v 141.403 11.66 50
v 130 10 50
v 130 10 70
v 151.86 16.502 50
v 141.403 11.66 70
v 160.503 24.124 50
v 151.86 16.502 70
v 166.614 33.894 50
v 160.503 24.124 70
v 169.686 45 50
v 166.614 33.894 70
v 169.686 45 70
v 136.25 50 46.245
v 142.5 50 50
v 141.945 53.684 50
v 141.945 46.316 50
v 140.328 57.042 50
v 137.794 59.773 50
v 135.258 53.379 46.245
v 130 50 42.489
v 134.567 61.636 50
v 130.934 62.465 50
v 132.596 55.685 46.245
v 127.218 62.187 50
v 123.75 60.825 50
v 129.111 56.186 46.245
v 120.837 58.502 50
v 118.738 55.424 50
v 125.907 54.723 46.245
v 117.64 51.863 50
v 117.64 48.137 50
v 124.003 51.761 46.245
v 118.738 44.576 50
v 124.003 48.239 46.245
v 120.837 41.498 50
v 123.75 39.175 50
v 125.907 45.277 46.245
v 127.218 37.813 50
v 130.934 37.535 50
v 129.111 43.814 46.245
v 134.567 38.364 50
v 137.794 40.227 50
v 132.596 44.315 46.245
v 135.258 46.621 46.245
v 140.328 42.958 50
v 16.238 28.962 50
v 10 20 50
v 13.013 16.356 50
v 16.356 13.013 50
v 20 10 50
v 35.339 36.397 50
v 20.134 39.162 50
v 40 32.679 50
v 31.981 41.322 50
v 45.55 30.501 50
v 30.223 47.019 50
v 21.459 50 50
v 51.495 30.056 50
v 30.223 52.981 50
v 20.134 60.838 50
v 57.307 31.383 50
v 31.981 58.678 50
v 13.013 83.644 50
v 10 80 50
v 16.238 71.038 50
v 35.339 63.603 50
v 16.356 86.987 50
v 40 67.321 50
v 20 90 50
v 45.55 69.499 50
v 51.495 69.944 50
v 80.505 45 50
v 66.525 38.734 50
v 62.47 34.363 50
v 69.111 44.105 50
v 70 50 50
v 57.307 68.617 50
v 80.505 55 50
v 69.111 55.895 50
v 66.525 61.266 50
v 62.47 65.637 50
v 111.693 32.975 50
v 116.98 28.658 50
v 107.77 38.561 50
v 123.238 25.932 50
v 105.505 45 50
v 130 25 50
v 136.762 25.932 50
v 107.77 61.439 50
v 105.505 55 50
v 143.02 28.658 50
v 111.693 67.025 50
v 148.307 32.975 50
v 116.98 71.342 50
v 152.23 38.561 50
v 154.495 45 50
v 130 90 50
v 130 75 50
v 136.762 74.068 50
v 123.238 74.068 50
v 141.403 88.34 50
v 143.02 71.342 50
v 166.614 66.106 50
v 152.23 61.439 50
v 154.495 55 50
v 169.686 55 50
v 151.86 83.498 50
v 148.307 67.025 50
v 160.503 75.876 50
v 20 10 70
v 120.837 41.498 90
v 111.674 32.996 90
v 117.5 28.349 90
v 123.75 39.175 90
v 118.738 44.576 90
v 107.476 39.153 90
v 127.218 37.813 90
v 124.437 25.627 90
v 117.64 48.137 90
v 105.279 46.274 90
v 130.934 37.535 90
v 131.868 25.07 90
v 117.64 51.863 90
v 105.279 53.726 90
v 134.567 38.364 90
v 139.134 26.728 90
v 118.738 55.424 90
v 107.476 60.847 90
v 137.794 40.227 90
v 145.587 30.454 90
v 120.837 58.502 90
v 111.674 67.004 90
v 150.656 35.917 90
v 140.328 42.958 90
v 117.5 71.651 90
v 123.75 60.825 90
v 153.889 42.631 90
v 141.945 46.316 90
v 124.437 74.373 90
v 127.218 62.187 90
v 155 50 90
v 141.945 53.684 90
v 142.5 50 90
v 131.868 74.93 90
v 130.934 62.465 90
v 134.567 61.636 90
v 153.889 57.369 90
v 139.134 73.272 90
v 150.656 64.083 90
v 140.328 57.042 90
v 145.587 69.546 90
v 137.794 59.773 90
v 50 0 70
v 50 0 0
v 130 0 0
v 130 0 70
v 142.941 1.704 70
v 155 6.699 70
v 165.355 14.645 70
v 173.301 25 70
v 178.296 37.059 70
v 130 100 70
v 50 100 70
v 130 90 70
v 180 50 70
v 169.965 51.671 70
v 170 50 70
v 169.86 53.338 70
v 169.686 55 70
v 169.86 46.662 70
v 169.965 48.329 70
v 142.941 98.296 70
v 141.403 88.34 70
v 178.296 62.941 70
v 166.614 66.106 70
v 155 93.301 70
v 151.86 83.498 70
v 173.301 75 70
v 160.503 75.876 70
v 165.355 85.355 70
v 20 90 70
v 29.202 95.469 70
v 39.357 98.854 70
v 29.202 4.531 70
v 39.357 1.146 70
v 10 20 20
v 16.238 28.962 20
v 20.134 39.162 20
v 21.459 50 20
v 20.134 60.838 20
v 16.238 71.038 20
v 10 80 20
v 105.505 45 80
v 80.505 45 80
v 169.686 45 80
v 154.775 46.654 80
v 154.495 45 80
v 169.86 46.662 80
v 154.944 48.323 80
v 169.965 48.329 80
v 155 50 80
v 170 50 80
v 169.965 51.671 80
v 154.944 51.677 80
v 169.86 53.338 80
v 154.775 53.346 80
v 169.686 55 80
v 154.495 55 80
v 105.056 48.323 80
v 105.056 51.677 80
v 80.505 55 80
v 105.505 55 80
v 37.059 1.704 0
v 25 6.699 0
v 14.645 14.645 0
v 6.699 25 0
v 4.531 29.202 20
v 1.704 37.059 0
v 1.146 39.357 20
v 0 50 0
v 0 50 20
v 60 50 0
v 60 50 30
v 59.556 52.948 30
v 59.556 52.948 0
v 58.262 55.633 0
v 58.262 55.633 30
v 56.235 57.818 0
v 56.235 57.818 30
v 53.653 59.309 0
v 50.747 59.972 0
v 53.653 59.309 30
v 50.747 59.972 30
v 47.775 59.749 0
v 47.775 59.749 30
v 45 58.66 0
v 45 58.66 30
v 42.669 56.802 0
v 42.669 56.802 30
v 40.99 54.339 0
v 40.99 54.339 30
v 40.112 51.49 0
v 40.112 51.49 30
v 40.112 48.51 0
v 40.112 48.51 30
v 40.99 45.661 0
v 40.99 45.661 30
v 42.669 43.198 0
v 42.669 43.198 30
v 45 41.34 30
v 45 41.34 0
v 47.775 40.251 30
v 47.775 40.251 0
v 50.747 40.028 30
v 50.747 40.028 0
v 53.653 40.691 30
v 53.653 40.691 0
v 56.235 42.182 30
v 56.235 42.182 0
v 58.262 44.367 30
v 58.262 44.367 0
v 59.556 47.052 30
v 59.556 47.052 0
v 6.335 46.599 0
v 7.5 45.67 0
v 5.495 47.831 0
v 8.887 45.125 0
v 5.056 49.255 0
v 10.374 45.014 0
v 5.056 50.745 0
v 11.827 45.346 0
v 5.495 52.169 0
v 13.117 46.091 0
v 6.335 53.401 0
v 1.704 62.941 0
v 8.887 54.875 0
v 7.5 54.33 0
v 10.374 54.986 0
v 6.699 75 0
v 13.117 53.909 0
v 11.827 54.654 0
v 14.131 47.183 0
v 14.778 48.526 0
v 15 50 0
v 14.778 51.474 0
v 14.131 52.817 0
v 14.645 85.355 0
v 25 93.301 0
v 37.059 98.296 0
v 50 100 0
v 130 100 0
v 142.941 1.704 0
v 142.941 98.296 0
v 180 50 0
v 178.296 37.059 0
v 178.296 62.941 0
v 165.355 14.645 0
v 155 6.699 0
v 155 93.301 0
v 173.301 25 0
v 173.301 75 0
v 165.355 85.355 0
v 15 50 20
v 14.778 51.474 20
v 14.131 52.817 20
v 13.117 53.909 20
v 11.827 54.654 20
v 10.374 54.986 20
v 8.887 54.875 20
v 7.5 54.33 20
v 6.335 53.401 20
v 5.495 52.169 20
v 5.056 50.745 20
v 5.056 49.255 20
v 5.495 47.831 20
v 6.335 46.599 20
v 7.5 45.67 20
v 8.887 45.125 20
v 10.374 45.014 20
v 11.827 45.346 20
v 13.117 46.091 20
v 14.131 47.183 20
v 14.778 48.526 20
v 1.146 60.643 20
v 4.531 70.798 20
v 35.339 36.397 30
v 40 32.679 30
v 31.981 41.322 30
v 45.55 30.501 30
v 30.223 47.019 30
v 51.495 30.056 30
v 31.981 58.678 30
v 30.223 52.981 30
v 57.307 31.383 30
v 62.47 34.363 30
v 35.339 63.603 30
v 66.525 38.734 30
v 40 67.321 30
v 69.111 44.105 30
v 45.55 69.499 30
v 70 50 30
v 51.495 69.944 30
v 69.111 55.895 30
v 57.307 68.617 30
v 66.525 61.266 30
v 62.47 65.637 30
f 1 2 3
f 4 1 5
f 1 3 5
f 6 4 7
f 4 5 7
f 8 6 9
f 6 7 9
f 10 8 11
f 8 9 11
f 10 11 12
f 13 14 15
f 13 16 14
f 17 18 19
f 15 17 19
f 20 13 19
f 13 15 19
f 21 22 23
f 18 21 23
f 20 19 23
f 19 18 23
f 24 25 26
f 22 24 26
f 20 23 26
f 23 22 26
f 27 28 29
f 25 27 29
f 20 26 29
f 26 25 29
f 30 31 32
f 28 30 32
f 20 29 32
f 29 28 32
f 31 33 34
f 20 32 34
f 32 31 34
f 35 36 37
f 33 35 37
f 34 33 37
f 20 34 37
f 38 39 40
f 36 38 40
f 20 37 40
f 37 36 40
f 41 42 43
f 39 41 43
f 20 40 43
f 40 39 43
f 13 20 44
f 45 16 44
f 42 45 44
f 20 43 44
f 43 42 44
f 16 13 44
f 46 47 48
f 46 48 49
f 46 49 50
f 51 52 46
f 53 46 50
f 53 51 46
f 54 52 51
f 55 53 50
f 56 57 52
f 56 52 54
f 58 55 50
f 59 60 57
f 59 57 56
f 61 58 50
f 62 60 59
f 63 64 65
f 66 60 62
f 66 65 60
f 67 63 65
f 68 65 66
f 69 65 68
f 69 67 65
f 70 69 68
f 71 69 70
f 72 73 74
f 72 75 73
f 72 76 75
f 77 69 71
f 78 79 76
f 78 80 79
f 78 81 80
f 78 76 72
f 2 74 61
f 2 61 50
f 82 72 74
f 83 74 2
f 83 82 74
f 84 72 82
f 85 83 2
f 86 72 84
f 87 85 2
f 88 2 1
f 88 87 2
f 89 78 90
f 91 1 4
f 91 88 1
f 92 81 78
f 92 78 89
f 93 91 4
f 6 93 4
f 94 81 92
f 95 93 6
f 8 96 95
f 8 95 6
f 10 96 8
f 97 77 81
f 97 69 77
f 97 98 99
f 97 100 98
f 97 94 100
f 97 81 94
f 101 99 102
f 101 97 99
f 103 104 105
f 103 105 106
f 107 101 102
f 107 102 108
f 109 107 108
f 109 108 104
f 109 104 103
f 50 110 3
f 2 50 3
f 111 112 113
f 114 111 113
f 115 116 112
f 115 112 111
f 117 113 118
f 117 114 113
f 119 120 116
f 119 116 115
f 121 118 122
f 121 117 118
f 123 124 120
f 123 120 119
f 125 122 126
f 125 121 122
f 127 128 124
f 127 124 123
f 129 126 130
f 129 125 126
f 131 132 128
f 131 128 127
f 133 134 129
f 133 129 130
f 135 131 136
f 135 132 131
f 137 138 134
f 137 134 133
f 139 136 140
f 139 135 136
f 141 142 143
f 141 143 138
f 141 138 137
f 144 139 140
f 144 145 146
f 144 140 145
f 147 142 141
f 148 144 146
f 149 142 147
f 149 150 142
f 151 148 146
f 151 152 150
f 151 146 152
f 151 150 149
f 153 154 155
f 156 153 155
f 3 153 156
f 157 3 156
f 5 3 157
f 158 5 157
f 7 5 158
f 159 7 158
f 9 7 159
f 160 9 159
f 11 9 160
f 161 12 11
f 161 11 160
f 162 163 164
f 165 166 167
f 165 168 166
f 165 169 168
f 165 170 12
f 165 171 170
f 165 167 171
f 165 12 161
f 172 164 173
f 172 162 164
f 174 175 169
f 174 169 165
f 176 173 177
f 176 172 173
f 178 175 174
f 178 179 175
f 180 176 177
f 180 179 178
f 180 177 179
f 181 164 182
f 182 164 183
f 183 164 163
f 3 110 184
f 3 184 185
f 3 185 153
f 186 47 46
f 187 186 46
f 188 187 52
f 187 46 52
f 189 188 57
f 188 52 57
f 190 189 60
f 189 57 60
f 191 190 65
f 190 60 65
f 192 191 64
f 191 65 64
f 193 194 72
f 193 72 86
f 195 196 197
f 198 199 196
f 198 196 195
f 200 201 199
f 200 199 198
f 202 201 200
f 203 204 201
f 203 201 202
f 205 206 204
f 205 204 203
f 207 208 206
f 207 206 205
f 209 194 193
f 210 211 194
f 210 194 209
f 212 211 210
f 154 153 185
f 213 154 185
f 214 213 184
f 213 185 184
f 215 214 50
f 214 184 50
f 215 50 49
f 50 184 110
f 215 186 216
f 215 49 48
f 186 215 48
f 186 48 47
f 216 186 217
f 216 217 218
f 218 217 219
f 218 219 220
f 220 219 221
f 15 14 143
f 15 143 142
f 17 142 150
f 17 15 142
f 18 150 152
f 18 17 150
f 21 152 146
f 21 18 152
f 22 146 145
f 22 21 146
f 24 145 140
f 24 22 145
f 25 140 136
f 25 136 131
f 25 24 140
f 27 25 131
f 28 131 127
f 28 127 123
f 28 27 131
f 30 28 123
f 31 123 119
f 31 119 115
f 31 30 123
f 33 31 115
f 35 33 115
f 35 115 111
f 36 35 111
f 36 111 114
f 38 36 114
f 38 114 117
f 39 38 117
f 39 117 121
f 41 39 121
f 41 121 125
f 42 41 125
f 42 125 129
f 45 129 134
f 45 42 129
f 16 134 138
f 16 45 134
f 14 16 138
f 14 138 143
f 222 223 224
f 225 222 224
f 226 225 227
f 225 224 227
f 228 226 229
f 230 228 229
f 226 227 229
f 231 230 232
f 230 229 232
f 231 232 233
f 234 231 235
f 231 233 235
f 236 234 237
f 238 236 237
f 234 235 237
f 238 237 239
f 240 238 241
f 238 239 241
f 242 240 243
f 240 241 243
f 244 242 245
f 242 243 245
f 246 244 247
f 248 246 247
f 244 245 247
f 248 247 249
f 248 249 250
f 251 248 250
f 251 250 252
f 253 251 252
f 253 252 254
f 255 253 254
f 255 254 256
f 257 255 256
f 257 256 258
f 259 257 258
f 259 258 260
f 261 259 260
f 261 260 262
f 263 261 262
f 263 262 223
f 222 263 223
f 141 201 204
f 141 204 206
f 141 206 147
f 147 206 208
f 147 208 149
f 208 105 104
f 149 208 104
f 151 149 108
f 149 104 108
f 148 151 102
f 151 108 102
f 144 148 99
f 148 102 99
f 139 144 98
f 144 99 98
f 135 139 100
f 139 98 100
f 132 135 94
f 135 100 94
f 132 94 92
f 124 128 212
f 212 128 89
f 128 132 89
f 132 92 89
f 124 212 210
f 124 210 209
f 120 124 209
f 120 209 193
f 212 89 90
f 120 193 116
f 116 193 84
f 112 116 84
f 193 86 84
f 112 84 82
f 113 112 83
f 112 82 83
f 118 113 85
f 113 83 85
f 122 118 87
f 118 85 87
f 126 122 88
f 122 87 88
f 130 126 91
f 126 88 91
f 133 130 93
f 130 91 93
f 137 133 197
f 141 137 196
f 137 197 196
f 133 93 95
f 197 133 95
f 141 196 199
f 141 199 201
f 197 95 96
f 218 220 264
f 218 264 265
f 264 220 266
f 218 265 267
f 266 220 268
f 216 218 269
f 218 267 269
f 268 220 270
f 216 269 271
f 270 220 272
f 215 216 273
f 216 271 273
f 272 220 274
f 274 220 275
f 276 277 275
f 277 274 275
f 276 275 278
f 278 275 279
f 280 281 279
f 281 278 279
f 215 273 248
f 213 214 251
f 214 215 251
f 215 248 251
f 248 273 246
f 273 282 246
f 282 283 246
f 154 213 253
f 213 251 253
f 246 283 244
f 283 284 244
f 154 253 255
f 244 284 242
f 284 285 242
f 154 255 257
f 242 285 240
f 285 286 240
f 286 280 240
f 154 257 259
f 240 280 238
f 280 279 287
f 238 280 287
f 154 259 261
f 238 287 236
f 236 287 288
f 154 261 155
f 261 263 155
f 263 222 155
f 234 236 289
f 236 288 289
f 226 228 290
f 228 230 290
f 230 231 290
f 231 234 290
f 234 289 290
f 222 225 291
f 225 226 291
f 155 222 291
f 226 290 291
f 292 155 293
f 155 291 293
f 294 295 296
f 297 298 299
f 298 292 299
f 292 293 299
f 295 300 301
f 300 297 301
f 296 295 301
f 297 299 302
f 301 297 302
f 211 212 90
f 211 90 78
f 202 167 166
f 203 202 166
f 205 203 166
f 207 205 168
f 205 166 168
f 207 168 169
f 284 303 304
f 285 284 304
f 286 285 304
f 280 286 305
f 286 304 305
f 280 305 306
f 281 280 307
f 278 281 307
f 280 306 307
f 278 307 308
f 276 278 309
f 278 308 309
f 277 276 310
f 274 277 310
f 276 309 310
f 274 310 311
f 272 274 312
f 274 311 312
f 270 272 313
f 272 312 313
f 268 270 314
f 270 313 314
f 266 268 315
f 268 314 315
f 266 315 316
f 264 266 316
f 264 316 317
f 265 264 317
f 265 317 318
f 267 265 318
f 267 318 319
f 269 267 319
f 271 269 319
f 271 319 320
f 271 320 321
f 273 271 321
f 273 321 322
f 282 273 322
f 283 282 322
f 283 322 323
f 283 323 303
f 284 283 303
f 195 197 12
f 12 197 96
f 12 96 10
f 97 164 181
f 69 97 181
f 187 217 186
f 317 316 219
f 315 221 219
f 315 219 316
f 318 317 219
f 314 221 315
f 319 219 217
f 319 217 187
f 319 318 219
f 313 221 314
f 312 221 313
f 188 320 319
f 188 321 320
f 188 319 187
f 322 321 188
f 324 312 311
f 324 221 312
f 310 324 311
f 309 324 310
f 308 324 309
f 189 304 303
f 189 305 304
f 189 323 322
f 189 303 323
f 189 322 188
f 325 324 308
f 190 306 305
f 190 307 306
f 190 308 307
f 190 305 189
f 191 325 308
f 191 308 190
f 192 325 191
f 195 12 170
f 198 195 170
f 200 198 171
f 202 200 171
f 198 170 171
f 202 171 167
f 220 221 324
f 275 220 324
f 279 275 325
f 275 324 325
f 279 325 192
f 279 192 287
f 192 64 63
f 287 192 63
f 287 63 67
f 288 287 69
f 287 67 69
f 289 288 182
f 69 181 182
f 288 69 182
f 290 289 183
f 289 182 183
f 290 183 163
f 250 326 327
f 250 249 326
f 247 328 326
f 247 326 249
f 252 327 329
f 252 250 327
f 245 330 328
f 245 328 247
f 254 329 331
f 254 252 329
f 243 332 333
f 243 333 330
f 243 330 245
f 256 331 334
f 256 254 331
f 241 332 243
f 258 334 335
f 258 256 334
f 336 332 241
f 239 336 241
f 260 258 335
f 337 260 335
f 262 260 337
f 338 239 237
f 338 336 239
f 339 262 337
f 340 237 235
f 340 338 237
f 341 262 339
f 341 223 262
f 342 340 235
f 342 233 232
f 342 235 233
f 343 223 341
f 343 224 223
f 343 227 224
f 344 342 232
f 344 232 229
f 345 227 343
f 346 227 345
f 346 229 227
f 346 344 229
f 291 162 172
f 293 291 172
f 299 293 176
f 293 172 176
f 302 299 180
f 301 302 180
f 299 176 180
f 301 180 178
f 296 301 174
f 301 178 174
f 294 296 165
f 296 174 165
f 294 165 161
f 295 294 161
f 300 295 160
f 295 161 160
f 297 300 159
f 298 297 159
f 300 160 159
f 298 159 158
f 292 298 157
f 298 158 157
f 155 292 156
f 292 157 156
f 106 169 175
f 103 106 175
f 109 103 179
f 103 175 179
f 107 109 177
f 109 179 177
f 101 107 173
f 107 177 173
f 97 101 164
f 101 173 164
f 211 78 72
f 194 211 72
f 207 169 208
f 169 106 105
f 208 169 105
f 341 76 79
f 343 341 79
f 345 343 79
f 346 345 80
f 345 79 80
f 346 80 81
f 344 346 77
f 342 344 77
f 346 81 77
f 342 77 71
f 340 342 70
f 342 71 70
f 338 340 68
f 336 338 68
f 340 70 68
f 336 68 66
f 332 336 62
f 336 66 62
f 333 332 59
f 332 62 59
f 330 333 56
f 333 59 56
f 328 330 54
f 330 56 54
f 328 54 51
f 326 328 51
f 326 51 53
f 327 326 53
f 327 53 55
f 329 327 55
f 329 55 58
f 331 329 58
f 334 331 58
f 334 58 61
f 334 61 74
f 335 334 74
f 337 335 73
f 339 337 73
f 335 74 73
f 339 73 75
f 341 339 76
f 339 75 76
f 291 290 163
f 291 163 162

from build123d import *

# Parameters (mm, degrees)
SKETCH1_W                  = 180
SKETCH1_H                  = 100
BOSS_EXTRUDE2_DEPTH        = 70
CUT_EXTRUDE1_DEPTH         = 70
SKETCH3_R                  = 5
CUT_EXTRUDE2_DEPTH         = 70
SKETCH4_R                  = 5
CUT_EXTRUDE3_DEPTH         = 50
SKETCH5_R                  = 10
CUT_EXTRUDE4_DEPTH         = 106
SKETCH6_R                  = 15
CUT_EXTRUDE5_DEPTH         = 40
SKETCH8_R                  = 15
SKETCH8_R_2                = 12.5
BOSS_EXTRUDE3_DEPTH        = 40
SKETCH10_R                 = 12.5
BOSS_EXTRUDE4_DEPTH        = 65
F_25_0MM_DOWEL_HOLE2_D     = 25
F_25_0MM_DOWEL_HOLE2_DEPTH = 20
F_25_0MM_DOWEL_HOLE2_TIP   = 7.510757738
SKETCH12_R                 = 10
SKETCH12_R_2               = 12.5
CUT_EXTRUDE6_DEPTH         = 20
SKETCH13_R                 = 25
SKETCH13_R_2               = 12.5
BOSS_EXTRUDE5_DEPTH        = 40
SKETCH14_R                 = 20
SKETCH14_R_2               = 10
CUT_EXTRUDE7_DEPTH         = 20
BOSS_EXTRUDE10_DEPTH       = 30
BOSS_EXTRUDE13_DEPTH       = 30


with BuildPart() as part:
    # Sketch1 → Boss-Extrude2 (new body)
    with BuildSketch(Plane.XY):
        with Locations((90, 50)):
            Rectangle(SKETCH1_W, SKETCH1_H)
    extrude(amount=BOSS_EXTRUDE2_DEPTH)

    # Sketch2 → Cut-Extrude1 (cut)
    with BuildSketch(Plane.XY.offset(70)):
        with BuildLine():
            Line((50, 100), (0, 100))
            Line((0, 100), (0, 50))
            ThreePointArc((0, 50), (14.644660941, 85.355339059), (50, 100))
        make_face()
        with BuildLine():
            ThreePointArc((50, 0), (14.644660941, 14.644660941), (0, 50))
            Line((0, 50), (0, 0))
            Line((0, 0), (50, 0))
        make_face()
        with BuildLine():
            Line((180, 0), (180, 50))
            ThreePointArc((180, 50), (165.355339059, 14.644660941), (130, 0))
            Line((130, 0), (180, 0))
        make_face()
        with BuildLine():
            Line((180, 100), (130, 100))
            ThreePointArc((130, 100), (165.355339059, 85.355339059), (180, 50))
            Line((180, 50), (180, 100))
        make_face()
    extrude(amount=-CUT_EXTRUDE1_DEPTH, mode=Mode.SUBTRACT)

    # Sketch3 → Cut-Extrude2 (cut)
    with BuildSketch(Plane.XY.offset(70)):
        with Locations((10, 50)):
            Circle(SKETCH3_R)
    extrude(amount=-CUT_EXTRUDE2_DEPTH, mode=Mode.SUBTRACT)

    # Sketch4 → Cut-Extrude3 (cut)
    with BuildSketch(Plane.XY.offset(70)):
        with BuildLine():
            ThreePointArc((10, 20), (21.458980338, 50), (10, 80))
            ThreePointArc((10, 80), (0, 50), (10, 20))
        make_face()
        with Locations((10, 50)):
            Circle(SKETCH4_R, mode=Mode.SUBTRACT)
    extrude(amount=-CUT_EXTRUDE3_DEPTH, mode=Mode.SUBTRACT)

    # Sketch5 → Cut-Extrude4 (cut)
    with BuildSketch(Plane.XY.offset(70)):
        with Locations((50, 50)):
            Circle(SKETCH5_R)
    extrude(amount=-CUT_EXTRUDE4_DEPTH, mode=Mode.SUBTRACT)

    # Sketch6 → Cut-Extrude5 (cut)
    with BuildSketch(Plane.XY.offset(70)):
        with Locations((130, 50)):
            Circle(SKETCH6_R)
    extrude(amount=-CUT_EXTRUDE5_DEPTH, mode=Mode.SUBTRACT)

    # Sketch8 → Boss-Extrude3 (add)
    with BuildSketch(Plane.XY.offset(70)):
        with Locations((130, 50)):
            Circle(SKETCH8_R)
        with Locations((130, 50)):
            Circle(SKETCH8_R_2, mode=Mode.SUBTRACT)
    extrude(amount=-BOSS_EXTRUDE3_DEPTH)

    # Sketch10 → Boss-Extrude4 (add)
    with BuildSketch(Plane.XY.offset(70)):
        with Locations((130, 50)):
            Circle(SKETCH10_R)
    extrude(amount=-BOSS_EXTRUDE4_DEPTH)

    # Ø25.0mm Dowel Hole2
    with Locations(Plane(origin=(130, 50, 70), x_dir=(1, 0, 0), z_dir=(0, 0, 1))):
        with Locations((0, 0)):
            Hole(F_25_0MM_DOWEL_HOLE2_D / 2, depth=F_25_0MM_DOWEL_HOLE2_DEPTH)
            with Locations((0, 0, -(F_25_0MM_DOWEL_HOLE2_DEPTH + F_25_0MM_DOWEL_HOLE2_TIP / 2))):  # 118° drill point
                Cone(0, F_25_0MM_DOWEL_HOLE2_D / 2, F_25_0MM_DOWEL_HOLE2_TIP, mode=Mode.SUBTRACT)

    # Sketch12 → Cut-Extrude6 (cut)
    with BuildSketch(Plane.XY.offset(70)):
        with BuildLine():
            ThreePointArc((130, 10), (170, 50), (130, 90))
            Line((130, 90), (20, 90))
            ThreePointArc((20, 90), (14.644660941, 85.355339059), (10, 80))
            ThreePointArc((10, 80), (21.458980338, 50), (10, 20))
            ThreePointArc((10, 20), (14.644660941, 14.644660941), (20, 10))
            Line((20, 10), (130, 10))
        make_face()
        with Locations((50, 50)):
            Circle(SKETCH12_R, mode=Mode.SUBTRACT)
        with Locations((130, 50)):
            Circle(SKETCH12_R_2, mode=Mode.SUBTRACT)
    extrude(amount=-CUT_EXTRUDE6_DEPTH, mode=Mode.SUBTRACT)

    # Sketch13 → Boss-Extrude5 (add)
    with BuildSketch(Plane.XY.offset(50)):
        with Locations((130, 50)):
            Circle(SKETCH13_R)
        with Locations((130, 50)):
            Circle(SKETCH13_R_2, mode=Mode.SUBTRACT)
    extrude(amount=BOSS_EXTRUDE5_DEPTH)

    # Sketch14 → Cut-Extrude7 (cut)
    with BuildSketch(Plane.XY.offset(50)):
        with Locations((50, 50)):
            Circle(SKETCH14_R)
        with Locations((50, 50)):
            Circle(SKETCH14_R_2, mode=Mode.SUBTRACT)
    extrude(amount=-CUT_EXTRUDE7_DEPTH, mode=Mode.SUBTRACT)

    # Sketch15 → Boss-Extrude10 (add)
    with BuildSketch(Plane.XY.offset(50)):
        with BuildLine():
            Line((105.505102572, 45), (105.505102572, 55))
            ThreePointArc((105.505102572, 55), (105, 50), (105.505102572, 45))
        make_face()
        with BuildLine():
            ThreePointArc((105.505102572, 45), (105, 50), (105.505102572, 55))
            Line((105.505102572, 55), (80.505102572, 55))
            Line((80.505102572, 55), (80.505102572, 45))
            Line((80.505102572, 45), (105.505102572, 45))
        make_face()
    extrude(amount=BOSS_EXTRUDE10_DEPTH)

    # Sketch16 → Boss-Extrude13 (add)
    with BuildSketch(Plane.XY.offset(50)):
        with BuildLine():
            Line((169.686269666, 55), (154.494897428, 55))
            ThreePointArc((154.494897428, 55), (155, 50), (154.494897428, 45))
            Line((154.494897428, 45), (169.686269666, 45))
            ThreePointArc((169.686269666, 45), (169.921490369, 47.495083498), (170, 50))
            ThreePointArc((170, 50), (169.921490369, 52.504916502), (169.686269666, 55))
        make_face()
    extrude(amount=BOSS_EXTRUDE13_DEPTH)


solid = part.part
